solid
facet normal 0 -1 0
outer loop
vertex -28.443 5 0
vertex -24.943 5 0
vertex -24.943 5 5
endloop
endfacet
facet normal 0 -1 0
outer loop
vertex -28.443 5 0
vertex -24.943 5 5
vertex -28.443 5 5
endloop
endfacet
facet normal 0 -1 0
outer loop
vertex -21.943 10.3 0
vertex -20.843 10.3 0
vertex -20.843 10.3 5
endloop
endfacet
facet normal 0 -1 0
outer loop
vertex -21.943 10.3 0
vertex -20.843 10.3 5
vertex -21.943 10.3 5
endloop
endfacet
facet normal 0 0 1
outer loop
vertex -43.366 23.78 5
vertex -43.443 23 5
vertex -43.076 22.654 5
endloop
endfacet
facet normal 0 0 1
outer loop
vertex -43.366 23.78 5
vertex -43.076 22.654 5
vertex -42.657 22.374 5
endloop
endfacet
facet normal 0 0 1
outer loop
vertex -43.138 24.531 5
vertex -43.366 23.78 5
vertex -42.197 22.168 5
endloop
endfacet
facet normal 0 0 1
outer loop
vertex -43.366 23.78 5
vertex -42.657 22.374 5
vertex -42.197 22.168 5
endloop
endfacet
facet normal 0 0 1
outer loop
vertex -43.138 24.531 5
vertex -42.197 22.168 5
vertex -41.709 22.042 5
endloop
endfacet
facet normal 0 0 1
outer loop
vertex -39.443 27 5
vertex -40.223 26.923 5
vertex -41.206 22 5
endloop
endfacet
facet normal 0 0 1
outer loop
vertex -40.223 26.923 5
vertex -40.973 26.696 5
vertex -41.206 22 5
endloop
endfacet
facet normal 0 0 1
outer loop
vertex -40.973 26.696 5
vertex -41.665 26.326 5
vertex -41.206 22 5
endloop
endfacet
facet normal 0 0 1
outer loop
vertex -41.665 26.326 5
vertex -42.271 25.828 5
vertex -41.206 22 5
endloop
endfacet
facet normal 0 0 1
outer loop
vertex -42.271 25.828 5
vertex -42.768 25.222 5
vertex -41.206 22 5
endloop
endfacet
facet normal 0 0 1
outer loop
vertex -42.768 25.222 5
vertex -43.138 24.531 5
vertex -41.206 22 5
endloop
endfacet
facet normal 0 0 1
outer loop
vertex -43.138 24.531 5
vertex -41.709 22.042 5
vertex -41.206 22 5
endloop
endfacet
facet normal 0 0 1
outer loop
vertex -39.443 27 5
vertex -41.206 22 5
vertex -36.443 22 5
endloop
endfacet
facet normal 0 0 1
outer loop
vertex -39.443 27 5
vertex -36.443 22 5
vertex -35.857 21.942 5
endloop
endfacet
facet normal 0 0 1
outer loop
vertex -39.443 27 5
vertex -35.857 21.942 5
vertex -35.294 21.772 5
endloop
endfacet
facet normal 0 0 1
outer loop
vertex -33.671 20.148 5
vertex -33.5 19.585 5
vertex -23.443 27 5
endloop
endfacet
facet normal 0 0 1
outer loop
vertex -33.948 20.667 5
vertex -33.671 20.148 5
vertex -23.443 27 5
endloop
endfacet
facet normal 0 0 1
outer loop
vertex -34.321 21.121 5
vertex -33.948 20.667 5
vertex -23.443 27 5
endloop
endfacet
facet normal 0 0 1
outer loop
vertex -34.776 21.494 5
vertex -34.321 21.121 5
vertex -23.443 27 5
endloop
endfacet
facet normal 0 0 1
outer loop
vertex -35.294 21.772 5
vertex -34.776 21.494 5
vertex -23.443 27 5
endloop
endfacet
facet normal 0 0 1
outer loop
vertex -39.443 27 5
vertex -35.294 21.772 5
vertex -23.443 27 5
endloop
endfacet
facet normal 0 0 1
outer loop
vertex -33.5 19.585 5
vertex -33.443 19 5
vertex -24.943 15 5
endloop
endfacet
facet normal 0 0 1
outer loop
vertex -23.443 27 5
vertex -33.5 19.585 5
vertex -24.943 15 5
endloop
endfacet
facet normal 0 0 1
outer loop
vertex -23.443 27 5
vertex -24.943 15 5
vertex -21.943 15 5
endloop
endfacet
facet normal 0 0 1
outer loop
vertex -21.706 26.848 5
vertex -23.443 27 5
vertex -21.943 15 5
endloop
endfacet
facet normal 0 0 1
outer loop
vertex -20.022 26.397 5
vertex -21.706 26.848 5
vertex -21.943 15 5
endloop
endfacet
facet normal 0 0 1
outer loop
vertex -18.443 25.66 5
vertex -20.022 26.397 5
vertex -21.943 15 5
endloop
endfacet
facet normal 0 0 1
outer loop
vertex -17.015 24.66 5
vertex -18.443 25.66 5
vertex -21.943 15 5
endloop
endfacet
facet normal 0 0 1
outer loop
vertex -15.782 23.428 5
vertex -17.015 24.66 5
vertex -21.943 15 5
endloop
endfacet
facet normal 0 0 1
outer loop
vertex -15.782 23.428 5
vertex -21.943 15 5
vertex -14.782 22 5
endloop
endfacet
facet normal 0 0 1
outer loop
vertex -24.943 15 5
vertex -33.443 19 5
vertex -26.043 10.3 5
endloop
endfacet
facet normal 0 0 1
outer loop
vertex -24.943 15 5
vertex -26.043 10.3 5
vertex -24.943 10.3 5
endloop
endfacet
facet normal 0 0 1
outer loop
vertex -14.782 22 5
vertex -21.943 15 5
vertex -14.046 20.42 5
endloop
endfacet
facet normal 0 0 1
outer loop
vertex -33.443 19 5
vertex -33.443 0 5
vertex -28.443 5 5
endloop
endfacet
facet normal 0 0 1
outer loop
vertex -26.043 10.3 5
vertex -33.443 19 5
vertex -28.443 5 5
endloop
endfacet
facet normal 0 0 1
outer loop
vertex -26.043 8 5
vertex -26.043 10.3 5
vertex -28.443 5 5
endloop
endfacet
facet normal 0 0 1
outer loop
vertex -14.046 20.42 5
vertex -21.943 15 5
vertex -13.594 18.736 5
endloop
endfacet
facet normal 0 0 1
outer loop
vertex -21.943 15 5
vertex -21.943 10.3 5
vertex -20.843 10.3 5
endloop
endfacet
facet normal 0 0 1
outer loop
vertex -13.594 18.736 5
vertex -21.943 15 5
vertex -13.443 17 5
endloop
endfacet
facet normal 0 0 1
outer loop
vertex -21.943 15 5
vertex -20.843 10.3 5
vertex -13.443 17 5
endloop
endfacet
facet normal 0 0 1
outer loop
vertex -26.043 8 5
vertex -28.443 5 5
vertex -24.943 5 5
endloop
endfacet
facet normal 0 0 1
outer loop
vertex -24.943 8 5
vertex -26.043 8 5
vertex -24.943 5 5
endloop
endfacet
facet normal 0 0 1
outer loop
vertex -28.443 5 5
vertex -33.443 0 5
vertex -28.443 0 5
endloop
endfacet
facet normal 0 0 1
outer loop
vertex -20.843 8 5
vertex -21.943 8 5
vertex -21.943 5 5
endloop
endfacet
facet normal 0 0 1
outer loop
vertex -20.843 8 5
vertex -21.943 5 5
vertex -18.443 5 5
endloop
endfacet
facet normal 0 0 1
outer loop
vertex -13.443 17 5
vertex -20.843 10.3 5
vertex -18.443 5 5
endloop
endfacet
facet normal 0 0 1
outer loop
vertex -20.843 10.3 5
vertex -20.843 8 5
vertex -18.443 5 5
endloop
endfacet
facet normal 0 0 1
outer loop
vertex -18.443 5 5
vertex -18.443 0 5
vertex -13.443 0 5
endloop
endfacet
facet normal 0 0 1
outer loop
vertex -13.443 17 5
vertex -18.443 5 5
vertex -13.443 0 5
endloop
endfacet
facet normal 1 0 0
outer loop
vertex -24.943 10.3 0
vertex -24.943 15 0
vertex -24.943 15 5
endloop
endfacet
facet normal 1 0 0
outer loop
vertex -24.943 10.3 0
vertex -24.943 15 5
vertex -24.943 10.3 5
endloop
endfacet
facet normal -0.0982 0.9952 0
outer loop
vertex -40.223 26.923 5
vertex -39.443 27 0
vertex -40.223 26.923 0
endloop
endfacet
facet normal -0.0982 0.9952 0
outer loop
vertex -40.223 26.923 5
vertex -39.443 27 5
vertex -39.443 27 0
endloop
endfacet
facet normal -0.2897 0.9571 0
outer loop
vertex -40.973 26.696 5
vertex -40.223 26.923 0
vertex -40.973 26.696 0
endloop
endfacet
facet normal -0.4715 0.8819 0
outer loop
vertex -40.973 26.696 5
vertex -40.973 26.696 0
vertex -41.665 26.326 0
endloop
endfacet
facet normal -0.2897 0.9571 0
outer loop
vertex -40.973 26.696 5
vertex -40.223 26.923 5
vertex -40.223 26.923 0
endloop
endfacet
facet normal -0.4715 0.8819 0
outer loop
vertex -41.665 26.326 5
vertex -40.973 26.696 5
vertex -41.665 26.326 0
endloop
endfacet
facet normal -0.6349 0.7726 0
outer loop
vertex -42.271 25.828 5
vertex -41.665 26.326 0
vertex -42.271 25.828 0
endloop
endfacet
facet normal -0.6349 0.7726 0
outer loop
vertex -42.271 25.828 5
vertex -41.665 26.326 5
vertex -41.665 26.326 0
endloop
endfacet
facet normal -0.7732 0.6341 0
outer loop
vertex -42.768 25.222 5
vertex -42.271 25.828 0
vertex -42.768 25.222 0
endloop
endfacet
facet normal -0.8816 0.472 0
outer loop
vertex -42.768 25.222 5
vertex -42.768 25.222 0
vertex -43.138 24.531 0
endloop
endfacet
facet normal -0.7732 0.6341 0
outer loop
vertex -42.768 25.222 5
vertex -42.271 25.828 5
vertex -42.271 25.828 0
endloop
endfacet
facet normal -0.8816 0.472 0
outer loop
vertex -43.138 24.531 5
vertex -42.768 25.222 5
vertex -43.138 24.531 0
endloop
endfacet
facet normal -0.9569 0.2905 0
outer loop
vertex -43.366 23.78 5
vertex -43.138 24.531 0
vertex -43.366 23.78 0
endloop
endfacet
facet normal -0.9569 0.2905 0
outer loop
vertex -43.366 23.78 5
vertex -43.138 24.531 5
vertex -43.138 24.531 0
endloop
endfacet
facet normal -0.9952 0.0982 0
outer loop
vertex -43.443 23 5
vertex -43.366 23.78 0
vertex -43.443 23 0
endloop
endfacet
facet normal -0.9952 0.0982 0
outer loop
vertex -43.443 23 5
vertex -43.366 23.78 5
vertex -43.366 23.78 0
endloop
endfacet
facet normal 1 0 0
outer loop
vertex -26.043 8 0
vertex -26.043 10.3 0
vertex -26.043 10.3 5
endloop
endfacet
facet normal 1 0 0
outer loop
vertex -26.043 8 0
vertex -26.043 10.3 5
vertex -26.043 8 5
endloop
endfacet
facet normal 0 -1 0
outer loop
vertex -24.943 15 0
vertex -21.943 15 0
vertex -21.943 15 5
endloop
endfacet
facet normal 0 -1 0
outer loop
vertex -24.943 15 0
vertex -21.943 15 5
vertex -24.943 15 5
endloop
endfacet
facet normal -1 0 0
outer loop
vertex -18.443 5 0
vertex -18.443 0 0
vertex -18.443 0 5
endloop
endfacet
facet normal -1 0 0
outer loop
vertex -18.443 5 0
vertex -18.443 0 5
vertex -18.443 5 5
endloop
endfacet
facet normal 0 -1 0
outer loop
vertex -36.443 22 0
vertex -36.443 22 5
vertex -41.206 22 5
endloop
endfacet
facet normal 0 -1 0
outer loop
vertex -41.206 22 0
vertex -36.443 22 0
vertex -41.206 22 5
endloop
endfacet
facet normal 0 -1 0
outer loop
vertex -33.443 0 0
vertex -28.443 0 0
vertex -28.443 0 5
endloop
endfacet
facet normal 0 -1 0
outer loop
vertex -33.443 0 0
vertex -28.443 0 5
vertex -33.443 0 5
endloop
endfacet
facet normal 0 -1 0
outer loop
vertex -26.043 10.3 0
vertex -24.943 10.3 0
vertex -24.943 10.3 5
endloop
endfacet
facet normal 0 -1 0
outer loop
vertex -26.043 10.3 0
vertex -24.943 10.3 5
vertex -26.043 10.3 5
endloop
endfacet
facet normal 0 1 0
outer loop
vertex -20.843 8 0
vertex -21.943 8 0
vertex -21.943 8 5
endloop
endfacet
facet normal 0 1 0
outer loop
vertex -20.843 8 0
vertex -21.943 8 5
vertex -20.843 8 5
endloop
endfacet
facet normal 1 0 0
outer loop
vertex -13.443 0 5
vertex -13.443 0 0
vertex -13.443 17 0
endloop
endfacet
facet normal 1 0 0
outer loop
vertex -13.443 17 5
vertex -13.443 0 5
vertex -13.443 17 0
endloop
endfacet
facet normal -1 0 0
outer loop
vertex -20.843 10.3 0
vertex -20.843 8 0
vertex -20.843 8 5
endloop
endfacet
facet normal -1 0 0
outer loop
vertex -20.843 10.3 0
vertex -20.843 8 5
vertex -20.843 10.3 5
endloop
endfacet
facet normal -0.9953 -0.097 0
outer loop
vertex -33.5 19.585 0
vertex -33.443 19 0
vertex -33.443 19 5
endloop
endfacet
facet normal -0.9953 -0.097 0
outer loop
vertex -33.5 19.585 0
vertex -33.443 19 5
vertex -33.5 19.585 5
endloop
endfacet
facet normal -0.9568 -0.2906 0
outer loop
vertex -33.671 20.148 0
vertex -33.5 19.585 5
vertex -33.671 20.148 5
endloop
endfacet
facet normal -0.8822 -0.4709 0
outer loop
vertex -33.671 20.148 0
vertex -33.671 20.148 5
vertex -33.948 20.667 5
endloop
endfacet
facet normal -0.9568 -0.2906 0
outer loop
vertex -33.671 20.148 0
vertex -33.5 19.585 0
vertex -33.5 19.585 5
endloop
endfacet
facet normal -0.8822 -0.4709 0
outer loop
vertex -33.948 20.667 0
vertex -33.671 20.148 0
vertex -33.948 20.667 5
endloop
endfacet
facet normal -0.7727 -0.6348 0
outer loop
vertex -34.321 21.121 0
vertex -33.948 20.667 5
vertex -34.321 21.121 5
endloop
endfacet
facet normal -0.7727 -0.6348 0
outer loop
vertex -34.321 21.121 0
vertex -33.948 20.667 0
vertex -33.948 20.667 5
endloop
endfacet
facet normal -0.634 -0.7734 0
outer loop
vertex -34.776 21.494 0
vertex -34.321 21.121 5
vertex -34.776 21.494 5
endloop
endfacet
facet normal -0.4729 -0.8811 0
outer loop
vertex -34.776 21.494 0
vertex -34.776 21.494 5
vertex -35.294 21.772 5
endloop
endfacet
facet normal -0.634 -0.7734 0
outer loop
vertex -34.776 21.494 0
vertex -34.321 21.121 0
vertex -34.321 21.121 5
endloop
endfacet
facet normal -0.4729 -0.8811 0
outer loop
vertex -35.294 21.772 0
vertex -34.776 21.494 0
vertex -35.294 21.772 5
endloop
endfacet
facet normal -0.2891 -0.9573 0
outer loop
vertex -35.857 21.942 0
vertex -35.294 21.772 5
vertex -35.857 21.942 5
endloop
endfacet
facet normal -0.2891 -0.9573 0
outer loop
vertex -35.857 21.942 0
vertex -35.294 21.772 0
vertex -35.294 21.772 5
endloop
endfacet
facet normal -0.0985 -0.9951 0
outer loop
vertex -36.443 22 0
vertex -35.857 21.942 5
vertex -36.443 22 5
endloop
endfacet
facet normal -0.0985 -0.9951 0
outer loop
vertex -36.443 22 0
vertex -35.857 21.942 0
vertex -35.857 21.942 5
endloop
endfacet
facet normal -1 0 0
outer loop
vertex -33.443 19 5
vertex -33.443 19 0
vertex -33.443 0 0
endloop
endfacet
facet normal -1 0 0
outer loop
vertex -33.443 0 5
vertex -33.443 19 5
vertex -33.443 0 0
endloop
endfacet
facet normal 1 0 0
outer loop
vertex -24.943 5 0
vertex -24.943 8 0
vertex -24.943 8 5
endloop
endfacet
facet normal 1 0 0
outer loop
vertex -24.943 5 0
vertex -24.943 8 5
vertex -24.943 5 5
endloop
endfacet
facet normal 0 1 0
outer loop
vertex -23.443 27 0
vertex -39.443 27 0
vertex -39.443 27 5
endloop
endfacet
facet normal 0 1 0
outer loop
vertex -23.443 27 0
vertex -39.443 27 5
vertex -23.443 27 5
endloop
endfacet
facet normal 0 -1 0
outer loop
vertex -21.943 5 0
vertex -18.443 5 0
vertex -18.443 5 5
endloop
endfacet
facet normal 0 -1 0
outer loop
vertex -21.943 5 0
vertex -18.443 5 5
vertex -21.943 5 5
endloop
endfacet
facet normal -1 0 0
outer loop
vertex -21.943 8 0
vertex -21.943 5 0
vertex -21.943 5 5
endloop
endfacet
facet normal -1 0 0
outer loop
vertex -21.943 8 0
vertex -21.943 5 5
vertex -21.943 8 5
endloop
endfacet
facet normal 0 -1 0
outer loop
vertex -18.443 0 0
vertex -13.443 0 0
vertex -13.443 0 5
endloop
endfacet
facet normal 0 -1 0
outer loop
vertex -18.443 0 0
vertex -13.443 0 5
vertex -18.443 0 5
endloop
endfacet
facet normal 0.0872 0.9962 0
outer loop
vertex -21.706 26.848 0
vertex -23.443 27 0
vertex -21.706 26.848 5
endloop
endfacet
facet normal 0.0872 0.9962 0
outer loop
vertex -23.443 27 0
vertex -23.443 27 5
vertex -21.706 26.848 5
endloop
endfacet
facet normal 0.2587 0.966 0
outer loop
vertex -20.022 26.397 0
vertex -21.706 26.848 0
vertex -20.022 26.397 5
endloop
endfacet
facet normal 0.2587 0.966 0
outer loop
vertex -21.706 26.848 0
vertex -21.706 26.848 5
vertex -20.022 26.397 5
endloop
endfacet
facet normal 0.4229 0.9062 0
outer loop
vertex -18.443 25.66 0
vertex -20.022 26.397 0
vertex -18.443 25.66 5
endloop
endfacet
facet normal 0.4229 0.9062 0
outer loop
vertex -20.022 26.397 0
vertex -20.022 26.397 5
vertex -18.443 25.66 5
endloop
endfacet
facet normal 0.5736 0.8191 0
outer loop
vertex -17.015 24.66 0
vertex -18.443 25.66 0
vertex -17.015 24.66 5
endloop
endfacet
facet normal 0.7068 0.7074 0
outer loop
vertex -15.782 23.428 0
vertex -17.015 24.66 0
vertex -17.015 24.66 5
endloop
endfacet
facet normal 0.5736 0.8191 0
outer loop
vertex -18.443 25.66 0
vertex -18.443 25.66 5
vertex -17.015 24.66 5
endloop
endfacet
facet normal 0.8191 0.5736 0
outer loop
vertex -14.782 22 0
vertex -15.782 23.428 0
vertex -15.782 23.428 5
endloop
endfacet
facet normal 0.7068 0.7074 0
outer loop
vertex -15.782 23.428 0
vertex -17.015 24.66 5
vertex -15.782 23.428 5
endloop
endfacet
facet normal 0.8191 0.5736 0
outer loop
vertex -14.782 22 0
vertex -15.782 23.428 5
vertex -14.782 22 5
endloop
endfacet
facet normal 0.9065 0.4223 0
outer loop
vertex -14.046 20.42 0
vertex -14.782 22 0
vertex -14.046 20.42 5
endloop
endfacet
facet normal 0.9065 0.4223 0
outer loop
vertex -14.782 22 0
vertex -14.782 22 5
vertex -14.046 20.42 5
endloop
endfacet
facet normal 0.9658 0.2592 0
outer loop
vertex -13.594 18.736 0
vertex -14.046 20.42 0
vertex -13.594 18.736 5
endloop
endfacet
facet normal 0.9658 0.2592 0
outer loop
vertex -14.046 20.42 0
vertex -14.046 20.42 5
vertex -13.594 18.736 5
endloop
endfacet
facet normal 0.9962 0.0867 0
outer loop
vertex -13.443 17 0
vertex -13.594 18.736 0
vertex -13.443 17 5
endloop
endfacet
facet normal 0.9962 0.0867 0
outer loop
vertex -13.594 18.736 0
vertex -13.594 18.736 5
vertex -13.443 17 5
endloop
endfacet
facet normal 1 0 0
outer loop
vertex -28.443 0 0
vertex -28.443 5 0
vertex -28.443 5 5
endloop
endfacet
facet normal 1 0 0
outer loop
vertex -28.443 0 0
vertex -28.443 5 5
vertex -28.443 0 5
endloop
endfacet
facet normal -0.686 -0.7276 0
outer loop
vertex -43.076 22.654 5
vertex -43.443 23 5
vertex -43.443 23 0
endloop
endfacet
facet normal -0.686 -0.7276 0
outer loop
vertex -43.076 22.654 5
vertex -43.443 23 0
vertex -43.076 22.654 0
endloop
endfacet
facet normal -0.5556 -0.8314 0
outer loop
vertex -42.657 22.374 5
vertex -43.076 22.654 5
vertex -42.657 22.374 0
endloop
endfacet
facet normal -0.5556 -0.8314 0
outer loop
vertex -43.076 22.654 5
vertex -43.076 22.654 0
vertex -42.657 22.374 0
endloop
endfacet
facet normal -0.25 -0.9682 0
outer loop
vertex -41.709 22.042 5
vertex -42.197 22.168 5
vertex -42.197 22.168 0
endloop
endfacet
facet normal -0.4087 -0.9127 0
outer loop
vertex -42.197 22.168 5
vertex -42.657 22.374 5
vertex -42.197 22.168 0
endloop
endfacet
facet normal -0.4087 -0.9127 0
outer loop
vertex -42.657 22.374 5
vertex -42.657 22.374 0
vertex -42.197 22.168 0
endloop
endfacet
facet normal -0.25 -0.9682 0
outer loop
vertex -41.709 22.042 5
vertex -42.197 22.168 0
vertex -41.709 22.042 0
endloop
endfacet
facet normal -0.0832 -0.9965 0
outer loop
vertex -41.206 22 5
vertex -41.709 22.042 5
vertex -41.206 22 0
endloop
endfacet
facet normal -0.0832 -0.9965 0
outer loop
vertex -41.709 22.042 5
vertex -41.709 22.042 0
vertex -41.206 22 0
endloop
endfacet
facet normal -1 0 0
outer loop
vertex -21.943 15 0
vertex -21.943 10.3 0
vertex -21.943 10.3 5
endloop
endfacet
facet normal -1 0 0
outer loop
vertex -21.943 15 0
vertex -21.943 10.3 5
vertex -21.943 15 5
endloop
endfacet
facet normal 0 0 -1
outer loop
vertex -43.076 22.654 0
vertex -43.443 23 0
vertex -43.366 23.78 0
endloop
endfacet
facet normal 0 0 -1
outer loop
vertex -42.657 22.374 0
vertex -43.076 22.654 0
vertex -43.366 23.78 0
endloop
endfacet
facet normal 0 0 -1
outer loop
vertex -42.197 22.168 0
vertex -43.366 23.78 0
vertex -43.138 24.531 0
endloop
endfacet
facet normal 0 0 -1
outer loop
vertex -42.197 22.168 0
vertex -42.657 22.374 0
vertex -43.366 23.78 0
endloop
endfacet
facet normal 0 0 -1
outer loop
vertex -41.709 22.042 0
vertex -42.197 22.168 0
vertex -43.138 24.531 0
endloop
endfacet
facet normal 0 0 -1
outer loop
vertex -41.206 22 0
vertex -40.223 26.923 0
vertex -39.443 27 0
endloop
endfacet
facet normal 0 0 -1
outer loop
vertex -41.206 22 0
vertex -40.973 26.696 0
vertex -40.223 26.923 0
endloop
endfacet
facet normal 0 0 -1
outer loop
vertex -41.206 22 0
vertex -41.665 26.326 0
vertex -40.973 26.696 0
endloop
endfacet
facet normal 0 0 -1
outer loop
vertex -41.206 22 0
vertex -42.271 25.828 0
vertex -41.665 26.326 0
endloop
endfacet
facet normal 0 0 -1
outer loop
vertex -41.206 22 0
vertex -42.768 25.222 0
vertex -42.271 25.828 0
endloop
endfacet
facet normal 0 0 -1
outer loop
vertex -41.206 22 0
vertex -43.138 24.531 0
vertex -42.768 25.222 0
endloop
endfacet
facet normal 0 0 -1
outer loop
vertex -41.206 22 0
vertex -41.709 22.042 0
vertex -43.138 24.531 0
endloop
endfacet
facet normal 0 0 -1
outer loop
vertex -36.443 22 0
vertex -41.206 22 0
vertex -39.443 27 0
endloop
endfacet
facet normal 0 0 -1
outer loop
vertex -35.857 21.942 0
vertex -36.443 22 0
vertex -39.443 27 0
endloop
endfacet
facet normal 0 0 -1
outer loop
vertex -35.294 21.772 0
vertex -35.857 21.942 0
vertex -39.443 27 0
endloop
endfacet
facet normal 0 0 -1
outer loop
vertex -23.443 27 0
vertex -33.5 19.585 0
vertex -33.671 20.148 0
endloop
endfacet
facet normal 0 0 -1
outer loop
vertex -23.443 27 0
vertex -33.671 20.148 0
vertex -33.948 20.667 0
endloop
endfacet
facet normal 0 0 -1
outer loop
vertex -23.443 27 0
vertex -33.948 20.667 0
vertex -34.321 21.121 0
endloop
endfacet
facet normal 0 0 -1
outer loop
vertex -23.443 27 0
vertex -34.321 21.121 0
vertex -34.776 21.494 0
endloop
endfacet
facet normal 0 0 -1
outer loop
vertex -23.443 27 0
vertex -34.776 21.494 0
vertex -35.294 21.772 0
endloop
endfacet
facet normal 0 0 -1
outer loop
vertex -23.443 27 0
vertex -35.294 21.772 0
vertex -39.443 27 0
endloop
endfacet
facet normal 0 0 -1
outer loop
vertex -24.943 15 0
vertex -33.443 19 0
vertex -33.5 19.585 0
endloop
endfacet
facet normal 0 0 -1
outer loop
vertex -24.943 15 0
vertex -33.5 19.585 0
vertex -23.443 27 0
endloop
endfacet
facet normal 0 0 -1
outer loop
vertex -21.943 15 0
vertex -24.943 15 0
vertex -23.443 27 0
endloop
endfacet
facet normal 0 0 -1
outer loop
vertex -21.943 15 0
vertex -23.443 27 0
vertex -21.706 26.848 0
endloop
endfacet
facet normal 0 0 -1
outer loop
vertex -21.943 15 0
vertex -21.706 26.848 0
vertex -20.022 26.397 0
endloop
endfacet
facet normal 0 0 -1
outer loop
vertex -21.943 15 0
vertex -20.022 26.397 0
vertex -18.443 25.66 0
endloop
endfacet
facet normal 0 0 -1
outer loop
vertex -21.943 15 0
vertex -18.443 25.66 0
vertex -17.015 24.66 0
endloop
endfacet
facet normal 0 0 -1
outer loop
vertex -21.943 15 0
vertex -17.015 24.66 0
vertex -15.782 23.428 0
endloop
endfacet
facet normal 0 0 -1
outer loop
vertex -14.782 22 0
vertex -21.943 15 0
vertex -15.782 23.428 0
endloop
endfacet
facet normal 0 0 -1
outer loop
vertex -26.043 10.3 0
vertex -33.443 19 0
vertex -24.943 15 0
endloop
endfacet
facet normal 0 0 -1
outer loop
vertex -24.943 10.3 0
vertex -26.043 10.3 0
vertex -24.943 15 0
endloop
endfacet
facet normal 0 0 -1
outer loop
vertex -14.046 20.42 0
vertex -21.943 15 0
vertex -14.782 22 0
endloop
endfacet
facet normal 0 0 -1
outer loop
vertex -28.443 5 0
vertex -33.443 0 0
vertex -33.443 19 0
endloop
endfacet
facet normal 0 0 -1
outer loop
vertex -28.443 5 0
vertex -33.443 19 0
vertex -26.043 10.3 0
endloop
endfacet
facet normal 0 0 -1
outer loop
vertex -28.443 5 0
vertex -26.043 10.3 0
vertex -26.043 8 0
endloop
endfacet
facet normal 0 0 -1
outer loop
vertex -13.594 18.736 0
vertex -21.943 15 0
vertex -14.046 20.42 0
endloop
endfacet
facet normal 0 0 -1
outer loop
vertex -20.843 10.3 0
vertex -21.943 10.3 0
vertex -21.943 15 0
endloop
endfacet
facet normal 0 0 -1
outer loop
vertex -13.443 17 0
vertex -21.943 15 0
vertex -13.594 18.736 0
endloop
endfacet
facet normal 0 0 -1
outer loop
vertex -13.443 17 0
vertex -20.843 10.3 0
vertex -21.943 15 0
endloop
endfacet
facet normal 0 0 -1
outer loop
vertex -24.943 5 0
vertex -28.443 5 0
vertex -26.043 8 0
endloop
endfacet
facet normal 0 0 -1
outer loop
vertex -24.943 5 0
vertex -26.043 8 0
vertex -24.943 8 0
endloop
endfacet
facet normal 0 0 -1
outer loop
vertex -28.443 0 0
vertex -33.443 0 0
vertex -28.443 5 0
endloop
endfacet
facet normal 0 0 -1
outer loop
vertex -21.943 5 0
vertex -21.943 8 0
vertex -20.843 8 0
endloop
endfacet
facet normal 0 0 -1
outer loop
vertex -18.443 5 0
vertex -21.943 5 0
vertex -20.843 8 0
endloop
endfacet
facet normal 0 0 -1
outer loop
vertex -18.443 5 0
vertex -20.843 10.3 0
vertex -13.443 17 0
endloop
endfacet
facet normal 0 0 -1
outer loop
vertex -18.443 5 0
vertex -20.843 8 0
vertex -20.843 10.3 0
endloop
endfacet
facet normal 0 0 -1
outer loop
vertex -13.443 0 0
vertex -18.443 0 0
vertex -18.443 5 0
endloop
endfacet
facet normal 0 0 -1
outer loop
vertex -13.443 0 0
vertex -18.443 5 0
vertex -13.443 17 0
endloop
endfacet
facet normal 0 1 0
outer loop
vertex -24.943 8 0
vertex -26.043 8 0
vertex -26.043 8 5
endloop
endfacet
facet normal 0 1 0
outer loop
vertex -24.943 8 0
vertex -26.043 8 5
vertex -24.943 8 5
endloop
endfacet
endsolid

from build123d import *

# Parameters (mm, degrees)
BOSS_EXTRUDE1_DEPTH = 5
FILLET1_R           = 10
FILLET2_R           = 4
FILLET3_R           = 3


with BuildPart() as part:
    # Sketch1 → Boss-Extrude1 (new body)
    with BuildSketch(Plane.XY):
        Polygon((-24.942517195, 5), (-28.442517195, 5), (-28.442517195, 0), (-33.442517195, 0), (-33.442517195, 5), (-33.442517195, 22), (-43.442517195, 22), (-43.442517195, 27), (-13.442517195, 27), (-13.442517195, 5), (-13.442517195, 0), (-18.442517195, 0), (-18.442517195, 5), (-21.942517195, 5), (-21.942517195, 8), (-20.842517195, 8), (-20.842517195, 10.3), (-21.942517195, 10.3), (-21.942517195, 15), (-24.942517195, 15), (-24.942517195, 10.3), (-26.042517195, 10.3), (-26.042517195, 8), (-24.942517195, 8), align=None)
    extrude(amount=BOSS_EXTRUDE1_DEPTH)

    # Fillet1
    fillet1_edges = [part.edges().sort_by_distance(p)[0] for p in [
        (-13.442517195, 27, 2.5),
    ]]
    fillet(fillet1_edges, radius=FILLET1_R)

    # Fillet2
    fillet2_edges = [part.edges().sort_by_distance(p)[0] for p in [
        (-43.442517195, 27, 2.5),
    ]]
    fillet(fillet2_edges, radius=FILLET2_R)

    # Fillet3
    # the kernel refuses this fillet: 3 mm, written as the material it adds along each edge
    with BuildSketch(Plane(origin=(-33.442517195, 22, 0), x_dir=(-1, 0, 0), z_dir=(0, 0, 1))) as fillet3_piece_1:
        with BuildLine():
            CenterArc((FILLET3_R, FILLET3_R), FILLET3_R, 180, 90)
            Line((0, FILLET3_R), (0, 0))
            Line((0, 0), (FILLET3_R, 0))
        make_face()
    extrude(amount=5)
    # the kernel refuses this fillet: 3 mm, written as the material it takes off along each edge
    with BuildSketch(Plane(origin=(-43.442517195, 22, -5.590169944), x_dir=(0, 1, 0), z_dir=(0, 0, 1))) as fillet3_2_piece_1:
        with BuildLine():
            CenterArc((3, -2.236067977), FILLET3_R, 131.810314896, 48.189685104)
            Line((0, -2.236067977), (0, 0))
            Line((0, 0), (1, 0))
        make_face()
    extrude(amount=16.180339887, mode=Mode.SUBTRACT)


solid = part.part
